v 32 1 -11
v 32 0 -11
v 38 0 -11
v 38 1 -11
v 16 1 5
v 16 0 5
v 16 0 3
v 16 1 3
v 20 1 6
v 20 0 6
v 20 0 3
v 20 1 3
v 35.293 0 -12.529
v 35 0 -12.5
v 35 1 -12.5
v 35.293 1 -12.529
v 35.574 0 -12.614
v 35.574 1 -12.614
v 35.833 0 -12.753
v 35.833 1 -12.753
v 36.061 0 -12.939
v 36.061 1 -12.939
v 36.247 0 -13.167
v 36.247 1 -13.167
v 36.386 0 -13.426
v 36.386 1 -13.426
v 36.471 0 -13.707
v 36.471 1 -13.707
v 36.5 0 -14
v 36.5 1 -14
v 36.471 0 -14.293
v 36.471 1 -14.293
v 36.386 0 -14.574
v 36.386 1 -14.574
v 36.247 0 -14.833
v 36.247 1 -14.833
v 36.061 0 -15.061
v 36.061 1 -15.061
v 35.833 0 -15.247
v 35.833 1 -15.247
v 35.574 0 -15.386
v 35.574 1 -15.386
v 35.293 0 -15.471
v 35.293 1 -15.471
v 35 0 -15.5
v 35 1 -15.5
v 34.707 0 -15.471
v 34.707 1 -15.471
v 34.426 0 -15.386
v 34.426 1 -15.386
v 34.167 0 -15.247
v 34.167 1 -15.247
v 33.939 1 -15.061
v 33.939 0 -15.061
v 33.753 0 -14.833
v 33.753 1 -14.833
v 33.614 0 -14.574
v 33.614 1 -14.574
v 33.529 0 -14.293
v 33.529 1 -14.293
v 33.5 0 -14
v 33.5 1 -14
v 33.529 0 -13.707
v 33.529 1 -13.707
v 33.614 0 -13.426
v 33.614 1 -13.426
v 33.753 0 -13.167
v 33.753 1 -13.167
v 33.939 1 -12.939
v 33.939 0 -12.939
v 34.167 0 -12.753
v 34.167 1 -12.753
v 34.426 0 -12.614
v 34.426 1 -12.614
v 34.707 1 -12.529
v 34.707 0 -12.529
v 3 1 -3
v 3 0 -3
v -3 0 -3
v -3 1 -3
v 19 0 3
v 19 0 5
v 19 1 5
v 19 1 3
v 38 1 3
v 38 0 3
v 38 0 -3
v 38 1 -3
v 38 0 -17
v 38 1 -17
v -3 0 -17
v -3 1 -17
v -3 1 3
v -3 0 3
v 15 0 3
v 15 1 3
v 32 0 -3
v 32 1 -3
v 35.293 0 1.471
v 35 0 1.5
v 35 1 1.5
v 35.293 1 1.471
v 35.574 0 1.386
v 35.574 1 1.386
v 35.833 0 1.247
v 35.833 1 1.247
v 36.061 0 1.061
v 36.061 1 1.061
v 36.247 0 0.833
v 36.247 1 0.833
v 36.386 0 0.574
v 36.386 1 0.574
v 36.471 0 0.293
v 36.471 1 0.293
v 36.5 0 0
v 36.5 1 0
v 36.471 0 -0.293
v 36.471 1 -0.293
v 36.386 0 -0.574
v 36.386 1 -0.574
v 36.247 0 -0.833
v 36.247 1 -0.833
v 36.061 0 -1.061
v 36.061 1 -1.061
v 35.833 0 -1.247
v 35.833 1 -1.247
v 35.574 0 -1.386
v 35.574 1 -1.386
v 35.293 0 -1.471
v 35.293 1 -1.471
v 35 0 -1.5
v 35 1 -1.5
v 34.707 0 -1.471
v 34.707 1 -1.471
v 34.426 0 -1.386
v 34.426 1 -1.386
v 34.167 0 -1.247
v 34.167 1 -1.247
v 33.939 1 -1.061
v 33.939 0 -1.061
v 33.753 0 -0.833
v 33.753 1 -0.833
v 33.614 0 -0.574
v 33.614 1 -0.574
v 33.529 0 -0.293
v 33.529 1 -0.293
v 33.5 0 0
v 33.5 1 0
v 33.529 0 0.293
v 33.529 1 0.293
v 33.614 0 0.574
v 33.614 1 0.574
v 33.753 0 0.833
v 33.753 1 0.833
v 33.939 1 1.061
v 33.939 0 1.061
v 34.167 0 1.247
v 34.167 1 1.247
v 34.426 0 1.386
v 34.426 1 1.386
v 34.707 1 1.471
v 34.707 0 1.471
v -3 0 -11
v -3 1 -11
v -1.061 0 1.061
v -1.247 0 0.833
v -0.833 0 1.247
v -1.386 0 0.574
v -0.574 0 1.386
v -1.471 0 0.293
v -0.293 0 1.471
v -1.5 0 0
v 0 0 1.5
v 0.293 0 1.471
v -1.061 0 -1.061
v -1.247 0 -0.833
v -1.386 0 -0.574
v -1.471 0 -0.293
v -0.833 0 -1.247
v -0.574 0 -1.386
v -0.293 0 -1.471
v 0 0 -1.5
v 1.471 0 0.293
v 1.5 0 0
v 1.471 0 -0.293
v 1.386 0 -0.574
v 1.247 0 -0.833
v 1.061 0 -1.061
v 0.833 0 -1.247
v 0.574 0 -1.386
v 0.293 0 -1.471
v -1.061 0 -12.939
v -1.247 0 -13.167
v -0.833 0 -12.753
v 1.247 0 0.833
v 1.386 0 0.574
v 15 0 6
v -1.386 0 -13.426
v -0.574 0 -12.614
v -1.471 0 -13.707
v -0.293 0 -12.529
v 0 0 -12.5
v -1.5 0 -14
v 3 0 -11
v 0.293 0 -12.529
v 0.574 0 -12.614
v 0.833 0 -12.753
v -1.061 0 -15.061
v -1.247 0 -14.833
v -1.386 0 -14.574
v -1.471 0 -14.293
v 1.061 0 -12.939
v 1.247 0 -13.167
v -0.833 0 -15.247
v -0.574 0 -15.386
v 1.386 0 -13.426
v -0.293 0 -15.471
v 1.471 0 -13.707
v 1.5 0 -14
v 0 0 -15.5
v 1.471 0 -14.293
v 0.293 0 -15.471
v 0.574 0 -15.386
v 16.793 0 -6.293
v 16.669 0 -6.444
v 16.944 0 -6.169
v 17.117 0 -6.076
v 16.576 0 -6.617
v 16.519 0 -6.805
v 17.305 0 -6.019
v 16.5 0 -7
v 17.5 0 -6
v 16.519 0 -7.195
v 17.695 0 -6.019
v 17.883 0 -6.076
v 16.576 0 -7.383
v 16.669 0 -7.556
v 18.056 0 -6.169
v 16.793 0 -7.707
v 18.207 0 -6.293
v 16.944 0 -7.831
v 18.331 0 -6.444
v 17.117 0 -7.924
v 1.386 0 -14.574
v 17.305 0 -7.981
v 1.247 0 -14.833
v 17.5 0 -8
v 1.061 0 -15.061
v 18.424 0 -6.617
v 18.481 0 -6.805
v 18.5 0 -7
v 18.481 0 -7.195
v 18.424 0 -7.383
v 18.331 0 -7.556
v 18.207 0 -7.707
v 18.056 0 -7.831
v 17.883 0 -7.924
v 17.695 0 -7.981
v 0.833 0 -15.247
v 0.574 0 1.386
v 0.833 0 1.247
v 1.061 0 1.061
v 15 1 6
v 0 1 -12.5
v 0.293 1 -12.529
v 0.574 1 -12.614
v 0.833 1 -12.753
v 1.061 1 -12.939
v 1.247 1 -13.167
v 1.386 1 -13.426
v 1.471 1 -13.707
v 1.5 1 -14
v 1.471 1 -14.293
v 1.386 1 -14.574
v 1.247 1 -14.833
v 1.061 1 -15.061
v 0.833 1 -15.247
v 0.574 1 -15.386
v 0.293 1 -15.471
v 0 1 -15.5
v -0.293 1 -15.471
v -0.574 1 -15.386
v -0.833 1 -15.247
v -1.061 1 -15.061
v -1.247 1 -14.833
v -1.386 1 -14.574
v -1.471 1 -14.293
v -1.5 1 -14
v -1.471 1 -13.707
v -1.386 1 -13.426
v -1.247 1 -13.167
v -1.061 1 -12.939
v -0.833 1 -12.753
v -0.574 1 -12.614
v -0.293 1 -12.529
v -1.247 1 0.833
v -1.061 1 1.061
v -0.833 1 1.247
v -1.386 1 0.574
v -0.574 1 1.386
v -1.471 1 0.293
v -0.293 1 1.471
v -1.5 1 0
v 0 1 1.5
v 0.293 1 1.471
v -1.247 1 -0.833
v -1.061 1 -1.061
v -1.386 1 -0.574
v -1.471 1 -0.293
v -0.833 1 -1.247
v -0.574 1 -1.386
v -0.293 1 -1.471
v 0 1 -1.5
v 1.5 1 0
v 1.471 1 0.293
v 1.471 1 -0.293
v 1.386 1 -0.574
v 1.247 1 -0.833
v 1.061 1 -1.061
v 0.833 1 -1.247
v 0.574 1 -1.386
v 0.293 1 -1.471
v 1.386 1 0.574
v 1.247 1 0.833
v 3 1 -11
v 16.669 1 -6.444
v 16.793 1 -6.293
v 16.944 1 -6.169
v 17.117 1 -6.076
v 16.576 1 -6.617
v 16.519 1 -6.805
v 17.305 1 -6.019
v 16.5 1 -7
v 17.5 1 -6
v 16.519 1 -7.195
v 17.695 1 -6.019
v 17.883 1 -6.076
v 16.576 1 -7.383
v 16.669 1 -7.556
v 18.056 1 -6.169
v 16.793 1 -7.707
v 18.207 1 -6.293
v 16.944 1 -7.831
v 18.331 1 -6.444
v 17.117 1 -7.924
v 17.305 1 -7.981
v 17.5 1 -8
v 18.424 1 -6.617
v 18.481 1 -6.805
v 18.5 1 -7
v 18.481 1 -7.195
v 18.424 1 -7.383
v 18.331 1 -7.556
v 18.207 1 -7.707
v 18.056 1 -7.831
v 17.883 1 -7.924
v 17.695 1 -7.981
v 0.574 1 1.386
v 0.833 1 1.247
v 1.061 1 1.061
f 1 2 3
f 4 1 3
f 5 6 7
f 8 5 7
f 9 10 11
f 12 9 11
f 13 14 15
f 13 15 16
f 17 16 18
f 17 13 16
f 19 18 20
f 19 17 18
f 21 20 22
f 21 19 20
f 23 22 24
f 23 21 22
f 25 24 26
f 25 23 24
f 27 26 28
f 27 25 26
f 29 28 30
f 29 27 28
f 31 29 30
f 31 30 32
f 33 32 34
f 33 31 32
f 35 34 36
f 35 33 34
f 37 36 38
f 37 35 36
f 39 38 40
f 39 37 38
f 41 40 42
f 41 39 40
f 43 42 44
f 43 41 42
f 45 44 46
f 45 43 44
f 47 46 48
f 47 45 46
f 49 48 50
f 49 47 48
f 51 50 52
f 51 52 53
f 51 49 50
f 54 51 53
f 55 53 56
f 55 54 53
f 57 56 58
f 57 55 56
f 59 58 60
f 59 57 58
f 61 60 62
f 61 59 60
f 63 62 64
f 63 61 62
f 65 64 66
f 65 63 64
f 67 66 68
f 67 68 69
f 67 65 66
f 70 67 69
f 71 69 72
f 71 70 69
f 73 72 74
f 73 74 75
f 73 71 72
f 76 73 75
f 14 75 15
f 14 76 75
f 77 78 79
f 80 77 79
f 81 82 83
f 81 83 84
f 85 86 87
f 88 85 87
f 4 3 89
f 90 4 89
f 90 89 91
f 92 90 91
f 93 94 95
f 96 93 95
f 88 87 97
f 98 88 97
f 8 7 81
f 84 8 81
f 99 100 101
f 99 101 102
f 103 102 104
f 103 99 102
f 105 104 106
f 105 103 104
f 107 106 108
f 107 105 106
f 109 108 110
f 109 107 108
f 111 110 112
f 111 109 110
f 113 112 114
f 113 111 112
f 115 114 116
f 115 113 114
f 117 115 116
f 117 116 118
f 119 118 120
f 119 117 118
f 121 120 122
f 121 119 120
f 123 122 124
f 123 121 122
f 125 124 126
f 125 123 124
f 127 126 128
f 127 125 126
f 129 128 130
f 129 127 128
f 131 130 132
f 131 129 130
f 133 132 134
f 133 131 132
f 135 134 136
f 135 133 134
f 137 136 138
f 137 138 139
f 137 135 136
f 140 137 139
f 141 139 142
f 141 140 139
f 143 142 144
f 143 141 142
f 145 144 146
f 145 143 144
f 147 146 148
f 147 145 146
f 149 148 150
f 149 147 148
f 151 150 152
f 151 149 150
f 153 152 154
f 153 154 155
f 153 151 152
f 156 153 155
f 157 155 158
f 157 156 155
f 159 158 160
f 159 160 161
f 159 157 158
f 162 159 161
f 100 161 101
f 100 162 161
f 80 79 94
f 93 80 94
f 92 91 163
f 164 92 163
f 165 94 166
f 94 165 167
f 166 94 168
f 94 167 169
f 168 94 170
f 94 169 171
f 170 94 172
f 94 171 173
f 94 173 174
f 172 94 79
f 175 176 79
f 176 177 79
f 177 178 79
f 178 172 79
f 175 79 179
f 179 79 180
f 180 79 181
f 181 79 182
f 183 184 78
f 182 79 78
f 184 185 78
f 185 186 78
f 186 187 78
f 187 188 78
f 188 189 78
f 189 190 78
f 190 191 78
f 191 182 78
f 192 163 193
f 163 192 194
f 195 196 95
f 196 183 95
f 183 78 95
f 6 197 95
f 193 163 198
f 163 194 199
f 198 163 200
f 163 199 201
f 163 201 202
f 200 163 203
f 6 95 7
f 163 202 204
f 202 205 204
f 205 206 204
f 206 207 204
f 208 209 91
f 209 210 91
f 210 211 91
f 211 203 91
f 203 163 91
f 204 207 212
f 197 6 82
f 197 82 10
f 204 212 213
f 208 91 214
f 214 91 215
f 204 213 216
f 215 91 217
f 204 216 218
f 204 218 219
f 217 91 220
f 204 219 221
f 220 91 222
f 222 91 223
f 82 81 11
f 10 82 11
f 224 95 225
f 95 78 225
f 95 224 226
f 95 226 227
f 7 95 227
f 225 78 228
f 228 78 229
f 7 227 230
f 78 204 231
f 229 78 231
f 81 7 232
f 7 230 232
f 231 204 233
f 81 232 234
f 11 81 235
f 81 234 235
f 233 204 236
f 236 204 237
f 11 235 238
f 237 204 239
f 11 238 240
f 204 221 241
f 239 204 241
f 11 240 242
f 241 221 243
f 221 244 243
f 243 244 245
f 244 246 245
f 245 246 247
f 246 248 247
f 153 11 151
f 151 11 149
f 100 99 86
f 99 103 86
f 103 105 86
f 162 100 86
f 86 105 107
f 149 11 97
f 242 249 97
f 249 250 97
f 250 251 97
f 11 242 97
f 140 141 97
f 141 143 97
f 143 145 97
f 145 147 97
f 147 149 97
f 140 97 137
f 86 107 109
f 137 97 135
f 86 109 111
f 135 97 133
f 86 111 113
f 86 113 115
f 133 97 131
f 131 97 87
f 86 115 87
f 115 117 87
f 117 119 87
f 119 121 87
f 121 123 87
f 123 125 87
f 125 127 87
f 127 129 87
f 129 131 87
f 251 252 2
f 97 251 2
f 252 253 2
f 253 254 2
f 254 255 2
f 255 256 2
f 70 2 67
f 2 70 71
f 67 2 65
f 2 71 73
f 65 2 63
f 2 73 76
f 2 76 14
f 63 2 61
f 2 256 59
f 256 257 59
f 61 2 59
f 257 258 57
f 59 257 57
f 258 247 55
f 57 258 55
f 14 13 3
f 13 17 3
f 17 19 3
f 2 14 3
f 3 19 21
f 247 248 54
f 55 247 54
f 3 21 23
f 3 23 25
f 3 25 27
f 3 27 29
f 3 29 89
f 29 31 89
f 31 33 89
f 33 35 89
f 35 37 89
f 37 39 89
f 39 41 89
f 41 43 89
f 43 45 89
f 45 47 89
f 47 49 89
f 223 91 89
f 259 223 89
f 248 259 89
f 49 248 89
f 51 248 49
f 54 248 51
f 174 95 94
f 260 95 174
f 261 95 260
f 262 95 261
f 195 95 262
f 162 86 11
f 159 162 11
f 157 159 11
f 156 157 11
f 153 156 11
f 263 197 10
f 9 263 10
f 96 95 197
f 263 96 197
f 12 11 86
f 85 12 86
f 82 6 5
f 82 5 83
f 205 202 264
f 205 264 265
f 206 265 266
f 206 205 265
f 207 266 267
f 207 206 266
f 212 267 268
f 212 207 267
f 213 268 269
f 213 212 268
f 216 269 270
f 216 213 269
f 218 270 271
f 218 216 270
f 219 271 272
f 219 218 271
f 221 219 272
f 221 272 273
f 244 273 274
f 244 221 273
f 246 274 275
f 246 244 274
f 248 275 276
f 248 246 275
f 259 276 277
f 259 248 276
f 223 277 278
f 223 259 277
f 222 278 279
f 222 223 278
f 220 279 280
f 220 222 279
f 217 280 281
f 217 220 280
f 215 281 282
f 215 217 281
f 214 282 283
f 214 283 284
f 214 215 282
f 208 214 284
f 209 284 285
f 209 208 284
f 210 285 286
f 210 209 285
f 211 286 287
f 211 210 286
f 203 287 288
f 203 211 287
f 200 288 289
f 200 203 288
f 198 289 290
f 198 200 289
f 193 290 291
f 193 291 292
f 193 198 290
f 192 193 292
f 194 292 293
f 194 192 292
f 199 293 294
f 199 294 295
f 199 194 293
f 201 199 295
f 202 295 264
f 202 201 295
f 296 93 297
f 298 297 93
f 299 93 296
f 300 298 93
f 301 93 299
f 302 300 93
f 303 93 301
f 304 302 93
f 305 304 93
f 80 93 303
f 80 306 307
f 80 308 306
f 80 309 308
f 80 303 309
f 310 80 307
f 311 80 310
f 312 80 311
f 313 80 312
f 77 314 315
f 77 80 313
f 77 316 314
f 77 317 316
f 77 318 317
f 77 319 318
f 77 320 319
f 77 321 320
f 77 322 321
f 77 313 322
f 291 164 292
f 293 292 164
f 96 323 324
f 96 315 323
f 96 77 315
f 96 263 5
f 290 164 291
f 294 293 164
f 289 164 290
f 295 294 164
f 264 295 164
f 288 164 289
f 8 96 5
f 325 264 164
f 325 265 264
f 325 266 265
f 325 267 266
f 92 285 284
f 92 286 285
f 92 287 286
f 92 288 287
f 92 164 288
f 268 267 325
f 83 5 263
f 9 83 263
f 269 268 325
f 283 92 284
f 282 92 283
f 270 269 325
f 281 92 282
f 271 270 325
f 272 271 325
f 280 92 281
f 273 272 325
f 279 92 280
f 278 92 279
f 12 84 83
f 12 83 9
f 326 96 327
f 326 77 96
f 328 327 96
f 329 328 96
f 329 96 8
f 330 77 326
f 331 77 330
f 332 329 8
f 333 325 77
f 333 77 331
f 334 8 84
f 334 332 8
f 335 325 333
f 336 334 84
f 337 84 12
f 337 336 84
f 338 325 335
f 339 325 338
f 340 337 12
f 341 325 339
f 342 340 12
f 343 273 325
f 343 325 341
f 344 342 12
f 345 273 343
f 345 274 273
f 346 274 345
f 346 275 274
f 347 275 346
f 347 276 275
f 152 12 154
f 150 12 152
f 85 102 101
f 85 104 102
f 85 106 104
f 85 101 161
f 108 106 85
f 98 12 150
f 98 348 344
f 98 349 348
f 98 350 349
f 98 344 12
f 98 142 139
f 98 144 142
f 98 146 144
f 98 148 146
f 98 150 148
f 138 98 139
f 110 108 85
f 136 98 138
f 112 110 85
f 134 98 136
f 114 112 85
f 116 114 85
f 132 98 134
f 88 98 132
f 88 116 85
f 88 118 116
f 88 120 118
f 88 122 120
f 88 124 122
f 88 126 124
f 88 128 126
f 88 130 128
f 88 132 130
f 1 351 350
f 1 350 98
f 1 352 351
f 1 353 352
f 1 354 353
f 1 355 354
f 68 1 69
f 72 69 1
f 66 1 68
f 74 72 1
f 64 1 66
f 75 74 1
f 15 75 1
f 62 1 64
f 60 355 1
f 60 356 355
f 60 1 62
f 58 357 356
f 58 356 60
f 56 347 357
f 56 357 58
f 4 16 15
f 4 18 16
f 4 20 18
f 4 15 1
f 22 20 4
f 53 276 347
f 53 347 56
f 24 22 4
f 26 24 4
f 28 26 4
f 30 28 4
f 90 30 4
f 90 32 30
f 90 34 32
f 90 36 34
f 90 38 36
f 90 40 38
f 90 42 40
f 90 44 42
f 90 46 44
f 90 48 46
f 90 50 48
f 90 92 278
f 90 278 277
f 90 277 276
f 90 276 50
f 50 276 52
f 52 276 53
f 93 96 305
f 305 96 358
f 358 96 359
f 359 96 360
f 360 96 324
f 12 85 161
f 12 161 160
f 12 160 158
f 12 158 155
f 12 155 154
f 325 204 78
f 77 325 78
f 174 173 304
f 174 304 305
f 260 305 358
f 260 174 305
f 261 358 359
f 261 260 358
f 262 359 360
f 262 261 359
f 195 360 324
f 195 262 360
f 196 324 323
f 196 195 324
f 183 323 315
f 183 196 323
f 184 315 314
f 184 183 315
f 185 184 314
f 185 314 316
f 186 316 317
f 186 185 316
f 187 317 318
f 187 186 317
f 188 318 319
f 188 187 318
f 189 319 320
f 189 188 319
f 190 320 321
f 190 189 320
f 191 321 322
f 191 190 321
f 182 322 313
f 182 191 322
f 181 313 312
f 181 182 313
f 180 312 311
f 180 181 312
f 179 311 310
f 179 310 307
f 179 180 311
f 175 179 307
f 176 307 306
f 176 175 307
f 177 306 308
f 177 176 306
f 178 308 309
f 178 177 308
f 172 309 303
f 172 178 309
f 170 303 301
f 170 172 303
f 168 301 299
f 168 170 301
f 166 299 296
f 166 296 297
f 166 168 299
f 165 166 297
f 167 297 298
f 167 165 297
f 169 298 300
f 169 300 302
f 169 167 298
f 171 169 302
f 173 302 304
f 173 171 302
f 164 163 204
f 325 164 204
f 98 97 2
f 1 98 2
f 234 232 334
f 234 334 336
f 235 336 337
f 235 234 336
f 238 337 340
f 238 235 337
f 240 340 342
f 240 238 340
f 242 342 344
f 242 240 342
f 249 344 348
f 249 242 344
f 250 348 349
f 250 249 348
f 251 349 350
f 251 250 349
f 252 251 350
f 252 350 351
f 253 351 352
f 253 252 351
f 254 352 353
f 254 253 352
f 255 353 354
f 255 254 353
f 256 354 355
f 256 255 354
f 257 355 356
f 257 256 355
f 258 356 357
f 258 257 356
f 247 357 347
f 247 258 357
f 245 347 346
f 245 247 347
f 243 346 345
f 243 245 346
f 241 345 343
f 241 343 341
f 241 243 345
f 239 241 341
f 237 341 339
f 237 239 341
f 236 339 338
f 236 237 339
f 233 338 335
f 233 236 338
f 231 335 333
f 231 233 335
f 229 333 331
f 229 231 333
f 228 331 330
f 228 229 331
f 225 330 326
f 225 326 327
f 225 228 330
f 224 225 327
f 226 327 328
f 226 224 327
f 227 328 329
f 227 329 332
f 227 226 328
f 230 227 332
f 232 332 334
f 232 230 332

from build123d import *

# Parameters (mm, degrees)
CROQUIS2_R              = 1.5
CROQUIS2_R_2            = 1
CROQUIS2_W              = 3
CROQUIS2_H              = 2
SALIENTE_EXTRUIR1_DEPTH = 1


with BuildPart() as part:
    # Croquis2 → Saliente-Extruir1 (new body)
    with BuildSketch(Plane(origin=(0, 0, 0), x_dir=(1, 0, 0), z_dir=(0, 1, 0))):
        Polygon((38, 17), (-3, 17), (-3, 11), (3, 11), (3, 3), (-3, 3), (-3, -3), (15, -3), (15, -6), (20, -6), (20, -3), (38, -3), (38, 3), (32, 3), (32, 11), (38, 11), align=None)
        with Locations(Location((0, 14, 0), (0, 0, 270))):
            Circle(CROQUIS2_R, mode=Mode.SUBTRACT)
        with Locations(Location((0, 0, 0), (0, 0, 270))):
            Circle(CROQUIS2_R, mode=Mode.SUBTRACT)
        with Locations(Location((35, 0, 0), (0, 0, 270))):
            Circle(CROQUIS2_R, mode=Mode.SUBTRACT)
        with Locations(Location((35, 14, 0), (0, 0, 270))):
            Circle(CROQUIS2_R, mode=Mode.SUBTRACT)
        with Locations(Location((17.5, 7, 0), (0, 0, 270))):
            Circle(CROQUIS2_R_2, mode=Mode.SUBTRACT)
        with Locations((17.5, -4)):
            Rectangle(CROQUIS2_W, CROQUIS2_H, mode=Mode.SUBTRACT)
    extrude(amount=SALIENTE_EXTRUIR1_DEPTH)


solid = part.part
